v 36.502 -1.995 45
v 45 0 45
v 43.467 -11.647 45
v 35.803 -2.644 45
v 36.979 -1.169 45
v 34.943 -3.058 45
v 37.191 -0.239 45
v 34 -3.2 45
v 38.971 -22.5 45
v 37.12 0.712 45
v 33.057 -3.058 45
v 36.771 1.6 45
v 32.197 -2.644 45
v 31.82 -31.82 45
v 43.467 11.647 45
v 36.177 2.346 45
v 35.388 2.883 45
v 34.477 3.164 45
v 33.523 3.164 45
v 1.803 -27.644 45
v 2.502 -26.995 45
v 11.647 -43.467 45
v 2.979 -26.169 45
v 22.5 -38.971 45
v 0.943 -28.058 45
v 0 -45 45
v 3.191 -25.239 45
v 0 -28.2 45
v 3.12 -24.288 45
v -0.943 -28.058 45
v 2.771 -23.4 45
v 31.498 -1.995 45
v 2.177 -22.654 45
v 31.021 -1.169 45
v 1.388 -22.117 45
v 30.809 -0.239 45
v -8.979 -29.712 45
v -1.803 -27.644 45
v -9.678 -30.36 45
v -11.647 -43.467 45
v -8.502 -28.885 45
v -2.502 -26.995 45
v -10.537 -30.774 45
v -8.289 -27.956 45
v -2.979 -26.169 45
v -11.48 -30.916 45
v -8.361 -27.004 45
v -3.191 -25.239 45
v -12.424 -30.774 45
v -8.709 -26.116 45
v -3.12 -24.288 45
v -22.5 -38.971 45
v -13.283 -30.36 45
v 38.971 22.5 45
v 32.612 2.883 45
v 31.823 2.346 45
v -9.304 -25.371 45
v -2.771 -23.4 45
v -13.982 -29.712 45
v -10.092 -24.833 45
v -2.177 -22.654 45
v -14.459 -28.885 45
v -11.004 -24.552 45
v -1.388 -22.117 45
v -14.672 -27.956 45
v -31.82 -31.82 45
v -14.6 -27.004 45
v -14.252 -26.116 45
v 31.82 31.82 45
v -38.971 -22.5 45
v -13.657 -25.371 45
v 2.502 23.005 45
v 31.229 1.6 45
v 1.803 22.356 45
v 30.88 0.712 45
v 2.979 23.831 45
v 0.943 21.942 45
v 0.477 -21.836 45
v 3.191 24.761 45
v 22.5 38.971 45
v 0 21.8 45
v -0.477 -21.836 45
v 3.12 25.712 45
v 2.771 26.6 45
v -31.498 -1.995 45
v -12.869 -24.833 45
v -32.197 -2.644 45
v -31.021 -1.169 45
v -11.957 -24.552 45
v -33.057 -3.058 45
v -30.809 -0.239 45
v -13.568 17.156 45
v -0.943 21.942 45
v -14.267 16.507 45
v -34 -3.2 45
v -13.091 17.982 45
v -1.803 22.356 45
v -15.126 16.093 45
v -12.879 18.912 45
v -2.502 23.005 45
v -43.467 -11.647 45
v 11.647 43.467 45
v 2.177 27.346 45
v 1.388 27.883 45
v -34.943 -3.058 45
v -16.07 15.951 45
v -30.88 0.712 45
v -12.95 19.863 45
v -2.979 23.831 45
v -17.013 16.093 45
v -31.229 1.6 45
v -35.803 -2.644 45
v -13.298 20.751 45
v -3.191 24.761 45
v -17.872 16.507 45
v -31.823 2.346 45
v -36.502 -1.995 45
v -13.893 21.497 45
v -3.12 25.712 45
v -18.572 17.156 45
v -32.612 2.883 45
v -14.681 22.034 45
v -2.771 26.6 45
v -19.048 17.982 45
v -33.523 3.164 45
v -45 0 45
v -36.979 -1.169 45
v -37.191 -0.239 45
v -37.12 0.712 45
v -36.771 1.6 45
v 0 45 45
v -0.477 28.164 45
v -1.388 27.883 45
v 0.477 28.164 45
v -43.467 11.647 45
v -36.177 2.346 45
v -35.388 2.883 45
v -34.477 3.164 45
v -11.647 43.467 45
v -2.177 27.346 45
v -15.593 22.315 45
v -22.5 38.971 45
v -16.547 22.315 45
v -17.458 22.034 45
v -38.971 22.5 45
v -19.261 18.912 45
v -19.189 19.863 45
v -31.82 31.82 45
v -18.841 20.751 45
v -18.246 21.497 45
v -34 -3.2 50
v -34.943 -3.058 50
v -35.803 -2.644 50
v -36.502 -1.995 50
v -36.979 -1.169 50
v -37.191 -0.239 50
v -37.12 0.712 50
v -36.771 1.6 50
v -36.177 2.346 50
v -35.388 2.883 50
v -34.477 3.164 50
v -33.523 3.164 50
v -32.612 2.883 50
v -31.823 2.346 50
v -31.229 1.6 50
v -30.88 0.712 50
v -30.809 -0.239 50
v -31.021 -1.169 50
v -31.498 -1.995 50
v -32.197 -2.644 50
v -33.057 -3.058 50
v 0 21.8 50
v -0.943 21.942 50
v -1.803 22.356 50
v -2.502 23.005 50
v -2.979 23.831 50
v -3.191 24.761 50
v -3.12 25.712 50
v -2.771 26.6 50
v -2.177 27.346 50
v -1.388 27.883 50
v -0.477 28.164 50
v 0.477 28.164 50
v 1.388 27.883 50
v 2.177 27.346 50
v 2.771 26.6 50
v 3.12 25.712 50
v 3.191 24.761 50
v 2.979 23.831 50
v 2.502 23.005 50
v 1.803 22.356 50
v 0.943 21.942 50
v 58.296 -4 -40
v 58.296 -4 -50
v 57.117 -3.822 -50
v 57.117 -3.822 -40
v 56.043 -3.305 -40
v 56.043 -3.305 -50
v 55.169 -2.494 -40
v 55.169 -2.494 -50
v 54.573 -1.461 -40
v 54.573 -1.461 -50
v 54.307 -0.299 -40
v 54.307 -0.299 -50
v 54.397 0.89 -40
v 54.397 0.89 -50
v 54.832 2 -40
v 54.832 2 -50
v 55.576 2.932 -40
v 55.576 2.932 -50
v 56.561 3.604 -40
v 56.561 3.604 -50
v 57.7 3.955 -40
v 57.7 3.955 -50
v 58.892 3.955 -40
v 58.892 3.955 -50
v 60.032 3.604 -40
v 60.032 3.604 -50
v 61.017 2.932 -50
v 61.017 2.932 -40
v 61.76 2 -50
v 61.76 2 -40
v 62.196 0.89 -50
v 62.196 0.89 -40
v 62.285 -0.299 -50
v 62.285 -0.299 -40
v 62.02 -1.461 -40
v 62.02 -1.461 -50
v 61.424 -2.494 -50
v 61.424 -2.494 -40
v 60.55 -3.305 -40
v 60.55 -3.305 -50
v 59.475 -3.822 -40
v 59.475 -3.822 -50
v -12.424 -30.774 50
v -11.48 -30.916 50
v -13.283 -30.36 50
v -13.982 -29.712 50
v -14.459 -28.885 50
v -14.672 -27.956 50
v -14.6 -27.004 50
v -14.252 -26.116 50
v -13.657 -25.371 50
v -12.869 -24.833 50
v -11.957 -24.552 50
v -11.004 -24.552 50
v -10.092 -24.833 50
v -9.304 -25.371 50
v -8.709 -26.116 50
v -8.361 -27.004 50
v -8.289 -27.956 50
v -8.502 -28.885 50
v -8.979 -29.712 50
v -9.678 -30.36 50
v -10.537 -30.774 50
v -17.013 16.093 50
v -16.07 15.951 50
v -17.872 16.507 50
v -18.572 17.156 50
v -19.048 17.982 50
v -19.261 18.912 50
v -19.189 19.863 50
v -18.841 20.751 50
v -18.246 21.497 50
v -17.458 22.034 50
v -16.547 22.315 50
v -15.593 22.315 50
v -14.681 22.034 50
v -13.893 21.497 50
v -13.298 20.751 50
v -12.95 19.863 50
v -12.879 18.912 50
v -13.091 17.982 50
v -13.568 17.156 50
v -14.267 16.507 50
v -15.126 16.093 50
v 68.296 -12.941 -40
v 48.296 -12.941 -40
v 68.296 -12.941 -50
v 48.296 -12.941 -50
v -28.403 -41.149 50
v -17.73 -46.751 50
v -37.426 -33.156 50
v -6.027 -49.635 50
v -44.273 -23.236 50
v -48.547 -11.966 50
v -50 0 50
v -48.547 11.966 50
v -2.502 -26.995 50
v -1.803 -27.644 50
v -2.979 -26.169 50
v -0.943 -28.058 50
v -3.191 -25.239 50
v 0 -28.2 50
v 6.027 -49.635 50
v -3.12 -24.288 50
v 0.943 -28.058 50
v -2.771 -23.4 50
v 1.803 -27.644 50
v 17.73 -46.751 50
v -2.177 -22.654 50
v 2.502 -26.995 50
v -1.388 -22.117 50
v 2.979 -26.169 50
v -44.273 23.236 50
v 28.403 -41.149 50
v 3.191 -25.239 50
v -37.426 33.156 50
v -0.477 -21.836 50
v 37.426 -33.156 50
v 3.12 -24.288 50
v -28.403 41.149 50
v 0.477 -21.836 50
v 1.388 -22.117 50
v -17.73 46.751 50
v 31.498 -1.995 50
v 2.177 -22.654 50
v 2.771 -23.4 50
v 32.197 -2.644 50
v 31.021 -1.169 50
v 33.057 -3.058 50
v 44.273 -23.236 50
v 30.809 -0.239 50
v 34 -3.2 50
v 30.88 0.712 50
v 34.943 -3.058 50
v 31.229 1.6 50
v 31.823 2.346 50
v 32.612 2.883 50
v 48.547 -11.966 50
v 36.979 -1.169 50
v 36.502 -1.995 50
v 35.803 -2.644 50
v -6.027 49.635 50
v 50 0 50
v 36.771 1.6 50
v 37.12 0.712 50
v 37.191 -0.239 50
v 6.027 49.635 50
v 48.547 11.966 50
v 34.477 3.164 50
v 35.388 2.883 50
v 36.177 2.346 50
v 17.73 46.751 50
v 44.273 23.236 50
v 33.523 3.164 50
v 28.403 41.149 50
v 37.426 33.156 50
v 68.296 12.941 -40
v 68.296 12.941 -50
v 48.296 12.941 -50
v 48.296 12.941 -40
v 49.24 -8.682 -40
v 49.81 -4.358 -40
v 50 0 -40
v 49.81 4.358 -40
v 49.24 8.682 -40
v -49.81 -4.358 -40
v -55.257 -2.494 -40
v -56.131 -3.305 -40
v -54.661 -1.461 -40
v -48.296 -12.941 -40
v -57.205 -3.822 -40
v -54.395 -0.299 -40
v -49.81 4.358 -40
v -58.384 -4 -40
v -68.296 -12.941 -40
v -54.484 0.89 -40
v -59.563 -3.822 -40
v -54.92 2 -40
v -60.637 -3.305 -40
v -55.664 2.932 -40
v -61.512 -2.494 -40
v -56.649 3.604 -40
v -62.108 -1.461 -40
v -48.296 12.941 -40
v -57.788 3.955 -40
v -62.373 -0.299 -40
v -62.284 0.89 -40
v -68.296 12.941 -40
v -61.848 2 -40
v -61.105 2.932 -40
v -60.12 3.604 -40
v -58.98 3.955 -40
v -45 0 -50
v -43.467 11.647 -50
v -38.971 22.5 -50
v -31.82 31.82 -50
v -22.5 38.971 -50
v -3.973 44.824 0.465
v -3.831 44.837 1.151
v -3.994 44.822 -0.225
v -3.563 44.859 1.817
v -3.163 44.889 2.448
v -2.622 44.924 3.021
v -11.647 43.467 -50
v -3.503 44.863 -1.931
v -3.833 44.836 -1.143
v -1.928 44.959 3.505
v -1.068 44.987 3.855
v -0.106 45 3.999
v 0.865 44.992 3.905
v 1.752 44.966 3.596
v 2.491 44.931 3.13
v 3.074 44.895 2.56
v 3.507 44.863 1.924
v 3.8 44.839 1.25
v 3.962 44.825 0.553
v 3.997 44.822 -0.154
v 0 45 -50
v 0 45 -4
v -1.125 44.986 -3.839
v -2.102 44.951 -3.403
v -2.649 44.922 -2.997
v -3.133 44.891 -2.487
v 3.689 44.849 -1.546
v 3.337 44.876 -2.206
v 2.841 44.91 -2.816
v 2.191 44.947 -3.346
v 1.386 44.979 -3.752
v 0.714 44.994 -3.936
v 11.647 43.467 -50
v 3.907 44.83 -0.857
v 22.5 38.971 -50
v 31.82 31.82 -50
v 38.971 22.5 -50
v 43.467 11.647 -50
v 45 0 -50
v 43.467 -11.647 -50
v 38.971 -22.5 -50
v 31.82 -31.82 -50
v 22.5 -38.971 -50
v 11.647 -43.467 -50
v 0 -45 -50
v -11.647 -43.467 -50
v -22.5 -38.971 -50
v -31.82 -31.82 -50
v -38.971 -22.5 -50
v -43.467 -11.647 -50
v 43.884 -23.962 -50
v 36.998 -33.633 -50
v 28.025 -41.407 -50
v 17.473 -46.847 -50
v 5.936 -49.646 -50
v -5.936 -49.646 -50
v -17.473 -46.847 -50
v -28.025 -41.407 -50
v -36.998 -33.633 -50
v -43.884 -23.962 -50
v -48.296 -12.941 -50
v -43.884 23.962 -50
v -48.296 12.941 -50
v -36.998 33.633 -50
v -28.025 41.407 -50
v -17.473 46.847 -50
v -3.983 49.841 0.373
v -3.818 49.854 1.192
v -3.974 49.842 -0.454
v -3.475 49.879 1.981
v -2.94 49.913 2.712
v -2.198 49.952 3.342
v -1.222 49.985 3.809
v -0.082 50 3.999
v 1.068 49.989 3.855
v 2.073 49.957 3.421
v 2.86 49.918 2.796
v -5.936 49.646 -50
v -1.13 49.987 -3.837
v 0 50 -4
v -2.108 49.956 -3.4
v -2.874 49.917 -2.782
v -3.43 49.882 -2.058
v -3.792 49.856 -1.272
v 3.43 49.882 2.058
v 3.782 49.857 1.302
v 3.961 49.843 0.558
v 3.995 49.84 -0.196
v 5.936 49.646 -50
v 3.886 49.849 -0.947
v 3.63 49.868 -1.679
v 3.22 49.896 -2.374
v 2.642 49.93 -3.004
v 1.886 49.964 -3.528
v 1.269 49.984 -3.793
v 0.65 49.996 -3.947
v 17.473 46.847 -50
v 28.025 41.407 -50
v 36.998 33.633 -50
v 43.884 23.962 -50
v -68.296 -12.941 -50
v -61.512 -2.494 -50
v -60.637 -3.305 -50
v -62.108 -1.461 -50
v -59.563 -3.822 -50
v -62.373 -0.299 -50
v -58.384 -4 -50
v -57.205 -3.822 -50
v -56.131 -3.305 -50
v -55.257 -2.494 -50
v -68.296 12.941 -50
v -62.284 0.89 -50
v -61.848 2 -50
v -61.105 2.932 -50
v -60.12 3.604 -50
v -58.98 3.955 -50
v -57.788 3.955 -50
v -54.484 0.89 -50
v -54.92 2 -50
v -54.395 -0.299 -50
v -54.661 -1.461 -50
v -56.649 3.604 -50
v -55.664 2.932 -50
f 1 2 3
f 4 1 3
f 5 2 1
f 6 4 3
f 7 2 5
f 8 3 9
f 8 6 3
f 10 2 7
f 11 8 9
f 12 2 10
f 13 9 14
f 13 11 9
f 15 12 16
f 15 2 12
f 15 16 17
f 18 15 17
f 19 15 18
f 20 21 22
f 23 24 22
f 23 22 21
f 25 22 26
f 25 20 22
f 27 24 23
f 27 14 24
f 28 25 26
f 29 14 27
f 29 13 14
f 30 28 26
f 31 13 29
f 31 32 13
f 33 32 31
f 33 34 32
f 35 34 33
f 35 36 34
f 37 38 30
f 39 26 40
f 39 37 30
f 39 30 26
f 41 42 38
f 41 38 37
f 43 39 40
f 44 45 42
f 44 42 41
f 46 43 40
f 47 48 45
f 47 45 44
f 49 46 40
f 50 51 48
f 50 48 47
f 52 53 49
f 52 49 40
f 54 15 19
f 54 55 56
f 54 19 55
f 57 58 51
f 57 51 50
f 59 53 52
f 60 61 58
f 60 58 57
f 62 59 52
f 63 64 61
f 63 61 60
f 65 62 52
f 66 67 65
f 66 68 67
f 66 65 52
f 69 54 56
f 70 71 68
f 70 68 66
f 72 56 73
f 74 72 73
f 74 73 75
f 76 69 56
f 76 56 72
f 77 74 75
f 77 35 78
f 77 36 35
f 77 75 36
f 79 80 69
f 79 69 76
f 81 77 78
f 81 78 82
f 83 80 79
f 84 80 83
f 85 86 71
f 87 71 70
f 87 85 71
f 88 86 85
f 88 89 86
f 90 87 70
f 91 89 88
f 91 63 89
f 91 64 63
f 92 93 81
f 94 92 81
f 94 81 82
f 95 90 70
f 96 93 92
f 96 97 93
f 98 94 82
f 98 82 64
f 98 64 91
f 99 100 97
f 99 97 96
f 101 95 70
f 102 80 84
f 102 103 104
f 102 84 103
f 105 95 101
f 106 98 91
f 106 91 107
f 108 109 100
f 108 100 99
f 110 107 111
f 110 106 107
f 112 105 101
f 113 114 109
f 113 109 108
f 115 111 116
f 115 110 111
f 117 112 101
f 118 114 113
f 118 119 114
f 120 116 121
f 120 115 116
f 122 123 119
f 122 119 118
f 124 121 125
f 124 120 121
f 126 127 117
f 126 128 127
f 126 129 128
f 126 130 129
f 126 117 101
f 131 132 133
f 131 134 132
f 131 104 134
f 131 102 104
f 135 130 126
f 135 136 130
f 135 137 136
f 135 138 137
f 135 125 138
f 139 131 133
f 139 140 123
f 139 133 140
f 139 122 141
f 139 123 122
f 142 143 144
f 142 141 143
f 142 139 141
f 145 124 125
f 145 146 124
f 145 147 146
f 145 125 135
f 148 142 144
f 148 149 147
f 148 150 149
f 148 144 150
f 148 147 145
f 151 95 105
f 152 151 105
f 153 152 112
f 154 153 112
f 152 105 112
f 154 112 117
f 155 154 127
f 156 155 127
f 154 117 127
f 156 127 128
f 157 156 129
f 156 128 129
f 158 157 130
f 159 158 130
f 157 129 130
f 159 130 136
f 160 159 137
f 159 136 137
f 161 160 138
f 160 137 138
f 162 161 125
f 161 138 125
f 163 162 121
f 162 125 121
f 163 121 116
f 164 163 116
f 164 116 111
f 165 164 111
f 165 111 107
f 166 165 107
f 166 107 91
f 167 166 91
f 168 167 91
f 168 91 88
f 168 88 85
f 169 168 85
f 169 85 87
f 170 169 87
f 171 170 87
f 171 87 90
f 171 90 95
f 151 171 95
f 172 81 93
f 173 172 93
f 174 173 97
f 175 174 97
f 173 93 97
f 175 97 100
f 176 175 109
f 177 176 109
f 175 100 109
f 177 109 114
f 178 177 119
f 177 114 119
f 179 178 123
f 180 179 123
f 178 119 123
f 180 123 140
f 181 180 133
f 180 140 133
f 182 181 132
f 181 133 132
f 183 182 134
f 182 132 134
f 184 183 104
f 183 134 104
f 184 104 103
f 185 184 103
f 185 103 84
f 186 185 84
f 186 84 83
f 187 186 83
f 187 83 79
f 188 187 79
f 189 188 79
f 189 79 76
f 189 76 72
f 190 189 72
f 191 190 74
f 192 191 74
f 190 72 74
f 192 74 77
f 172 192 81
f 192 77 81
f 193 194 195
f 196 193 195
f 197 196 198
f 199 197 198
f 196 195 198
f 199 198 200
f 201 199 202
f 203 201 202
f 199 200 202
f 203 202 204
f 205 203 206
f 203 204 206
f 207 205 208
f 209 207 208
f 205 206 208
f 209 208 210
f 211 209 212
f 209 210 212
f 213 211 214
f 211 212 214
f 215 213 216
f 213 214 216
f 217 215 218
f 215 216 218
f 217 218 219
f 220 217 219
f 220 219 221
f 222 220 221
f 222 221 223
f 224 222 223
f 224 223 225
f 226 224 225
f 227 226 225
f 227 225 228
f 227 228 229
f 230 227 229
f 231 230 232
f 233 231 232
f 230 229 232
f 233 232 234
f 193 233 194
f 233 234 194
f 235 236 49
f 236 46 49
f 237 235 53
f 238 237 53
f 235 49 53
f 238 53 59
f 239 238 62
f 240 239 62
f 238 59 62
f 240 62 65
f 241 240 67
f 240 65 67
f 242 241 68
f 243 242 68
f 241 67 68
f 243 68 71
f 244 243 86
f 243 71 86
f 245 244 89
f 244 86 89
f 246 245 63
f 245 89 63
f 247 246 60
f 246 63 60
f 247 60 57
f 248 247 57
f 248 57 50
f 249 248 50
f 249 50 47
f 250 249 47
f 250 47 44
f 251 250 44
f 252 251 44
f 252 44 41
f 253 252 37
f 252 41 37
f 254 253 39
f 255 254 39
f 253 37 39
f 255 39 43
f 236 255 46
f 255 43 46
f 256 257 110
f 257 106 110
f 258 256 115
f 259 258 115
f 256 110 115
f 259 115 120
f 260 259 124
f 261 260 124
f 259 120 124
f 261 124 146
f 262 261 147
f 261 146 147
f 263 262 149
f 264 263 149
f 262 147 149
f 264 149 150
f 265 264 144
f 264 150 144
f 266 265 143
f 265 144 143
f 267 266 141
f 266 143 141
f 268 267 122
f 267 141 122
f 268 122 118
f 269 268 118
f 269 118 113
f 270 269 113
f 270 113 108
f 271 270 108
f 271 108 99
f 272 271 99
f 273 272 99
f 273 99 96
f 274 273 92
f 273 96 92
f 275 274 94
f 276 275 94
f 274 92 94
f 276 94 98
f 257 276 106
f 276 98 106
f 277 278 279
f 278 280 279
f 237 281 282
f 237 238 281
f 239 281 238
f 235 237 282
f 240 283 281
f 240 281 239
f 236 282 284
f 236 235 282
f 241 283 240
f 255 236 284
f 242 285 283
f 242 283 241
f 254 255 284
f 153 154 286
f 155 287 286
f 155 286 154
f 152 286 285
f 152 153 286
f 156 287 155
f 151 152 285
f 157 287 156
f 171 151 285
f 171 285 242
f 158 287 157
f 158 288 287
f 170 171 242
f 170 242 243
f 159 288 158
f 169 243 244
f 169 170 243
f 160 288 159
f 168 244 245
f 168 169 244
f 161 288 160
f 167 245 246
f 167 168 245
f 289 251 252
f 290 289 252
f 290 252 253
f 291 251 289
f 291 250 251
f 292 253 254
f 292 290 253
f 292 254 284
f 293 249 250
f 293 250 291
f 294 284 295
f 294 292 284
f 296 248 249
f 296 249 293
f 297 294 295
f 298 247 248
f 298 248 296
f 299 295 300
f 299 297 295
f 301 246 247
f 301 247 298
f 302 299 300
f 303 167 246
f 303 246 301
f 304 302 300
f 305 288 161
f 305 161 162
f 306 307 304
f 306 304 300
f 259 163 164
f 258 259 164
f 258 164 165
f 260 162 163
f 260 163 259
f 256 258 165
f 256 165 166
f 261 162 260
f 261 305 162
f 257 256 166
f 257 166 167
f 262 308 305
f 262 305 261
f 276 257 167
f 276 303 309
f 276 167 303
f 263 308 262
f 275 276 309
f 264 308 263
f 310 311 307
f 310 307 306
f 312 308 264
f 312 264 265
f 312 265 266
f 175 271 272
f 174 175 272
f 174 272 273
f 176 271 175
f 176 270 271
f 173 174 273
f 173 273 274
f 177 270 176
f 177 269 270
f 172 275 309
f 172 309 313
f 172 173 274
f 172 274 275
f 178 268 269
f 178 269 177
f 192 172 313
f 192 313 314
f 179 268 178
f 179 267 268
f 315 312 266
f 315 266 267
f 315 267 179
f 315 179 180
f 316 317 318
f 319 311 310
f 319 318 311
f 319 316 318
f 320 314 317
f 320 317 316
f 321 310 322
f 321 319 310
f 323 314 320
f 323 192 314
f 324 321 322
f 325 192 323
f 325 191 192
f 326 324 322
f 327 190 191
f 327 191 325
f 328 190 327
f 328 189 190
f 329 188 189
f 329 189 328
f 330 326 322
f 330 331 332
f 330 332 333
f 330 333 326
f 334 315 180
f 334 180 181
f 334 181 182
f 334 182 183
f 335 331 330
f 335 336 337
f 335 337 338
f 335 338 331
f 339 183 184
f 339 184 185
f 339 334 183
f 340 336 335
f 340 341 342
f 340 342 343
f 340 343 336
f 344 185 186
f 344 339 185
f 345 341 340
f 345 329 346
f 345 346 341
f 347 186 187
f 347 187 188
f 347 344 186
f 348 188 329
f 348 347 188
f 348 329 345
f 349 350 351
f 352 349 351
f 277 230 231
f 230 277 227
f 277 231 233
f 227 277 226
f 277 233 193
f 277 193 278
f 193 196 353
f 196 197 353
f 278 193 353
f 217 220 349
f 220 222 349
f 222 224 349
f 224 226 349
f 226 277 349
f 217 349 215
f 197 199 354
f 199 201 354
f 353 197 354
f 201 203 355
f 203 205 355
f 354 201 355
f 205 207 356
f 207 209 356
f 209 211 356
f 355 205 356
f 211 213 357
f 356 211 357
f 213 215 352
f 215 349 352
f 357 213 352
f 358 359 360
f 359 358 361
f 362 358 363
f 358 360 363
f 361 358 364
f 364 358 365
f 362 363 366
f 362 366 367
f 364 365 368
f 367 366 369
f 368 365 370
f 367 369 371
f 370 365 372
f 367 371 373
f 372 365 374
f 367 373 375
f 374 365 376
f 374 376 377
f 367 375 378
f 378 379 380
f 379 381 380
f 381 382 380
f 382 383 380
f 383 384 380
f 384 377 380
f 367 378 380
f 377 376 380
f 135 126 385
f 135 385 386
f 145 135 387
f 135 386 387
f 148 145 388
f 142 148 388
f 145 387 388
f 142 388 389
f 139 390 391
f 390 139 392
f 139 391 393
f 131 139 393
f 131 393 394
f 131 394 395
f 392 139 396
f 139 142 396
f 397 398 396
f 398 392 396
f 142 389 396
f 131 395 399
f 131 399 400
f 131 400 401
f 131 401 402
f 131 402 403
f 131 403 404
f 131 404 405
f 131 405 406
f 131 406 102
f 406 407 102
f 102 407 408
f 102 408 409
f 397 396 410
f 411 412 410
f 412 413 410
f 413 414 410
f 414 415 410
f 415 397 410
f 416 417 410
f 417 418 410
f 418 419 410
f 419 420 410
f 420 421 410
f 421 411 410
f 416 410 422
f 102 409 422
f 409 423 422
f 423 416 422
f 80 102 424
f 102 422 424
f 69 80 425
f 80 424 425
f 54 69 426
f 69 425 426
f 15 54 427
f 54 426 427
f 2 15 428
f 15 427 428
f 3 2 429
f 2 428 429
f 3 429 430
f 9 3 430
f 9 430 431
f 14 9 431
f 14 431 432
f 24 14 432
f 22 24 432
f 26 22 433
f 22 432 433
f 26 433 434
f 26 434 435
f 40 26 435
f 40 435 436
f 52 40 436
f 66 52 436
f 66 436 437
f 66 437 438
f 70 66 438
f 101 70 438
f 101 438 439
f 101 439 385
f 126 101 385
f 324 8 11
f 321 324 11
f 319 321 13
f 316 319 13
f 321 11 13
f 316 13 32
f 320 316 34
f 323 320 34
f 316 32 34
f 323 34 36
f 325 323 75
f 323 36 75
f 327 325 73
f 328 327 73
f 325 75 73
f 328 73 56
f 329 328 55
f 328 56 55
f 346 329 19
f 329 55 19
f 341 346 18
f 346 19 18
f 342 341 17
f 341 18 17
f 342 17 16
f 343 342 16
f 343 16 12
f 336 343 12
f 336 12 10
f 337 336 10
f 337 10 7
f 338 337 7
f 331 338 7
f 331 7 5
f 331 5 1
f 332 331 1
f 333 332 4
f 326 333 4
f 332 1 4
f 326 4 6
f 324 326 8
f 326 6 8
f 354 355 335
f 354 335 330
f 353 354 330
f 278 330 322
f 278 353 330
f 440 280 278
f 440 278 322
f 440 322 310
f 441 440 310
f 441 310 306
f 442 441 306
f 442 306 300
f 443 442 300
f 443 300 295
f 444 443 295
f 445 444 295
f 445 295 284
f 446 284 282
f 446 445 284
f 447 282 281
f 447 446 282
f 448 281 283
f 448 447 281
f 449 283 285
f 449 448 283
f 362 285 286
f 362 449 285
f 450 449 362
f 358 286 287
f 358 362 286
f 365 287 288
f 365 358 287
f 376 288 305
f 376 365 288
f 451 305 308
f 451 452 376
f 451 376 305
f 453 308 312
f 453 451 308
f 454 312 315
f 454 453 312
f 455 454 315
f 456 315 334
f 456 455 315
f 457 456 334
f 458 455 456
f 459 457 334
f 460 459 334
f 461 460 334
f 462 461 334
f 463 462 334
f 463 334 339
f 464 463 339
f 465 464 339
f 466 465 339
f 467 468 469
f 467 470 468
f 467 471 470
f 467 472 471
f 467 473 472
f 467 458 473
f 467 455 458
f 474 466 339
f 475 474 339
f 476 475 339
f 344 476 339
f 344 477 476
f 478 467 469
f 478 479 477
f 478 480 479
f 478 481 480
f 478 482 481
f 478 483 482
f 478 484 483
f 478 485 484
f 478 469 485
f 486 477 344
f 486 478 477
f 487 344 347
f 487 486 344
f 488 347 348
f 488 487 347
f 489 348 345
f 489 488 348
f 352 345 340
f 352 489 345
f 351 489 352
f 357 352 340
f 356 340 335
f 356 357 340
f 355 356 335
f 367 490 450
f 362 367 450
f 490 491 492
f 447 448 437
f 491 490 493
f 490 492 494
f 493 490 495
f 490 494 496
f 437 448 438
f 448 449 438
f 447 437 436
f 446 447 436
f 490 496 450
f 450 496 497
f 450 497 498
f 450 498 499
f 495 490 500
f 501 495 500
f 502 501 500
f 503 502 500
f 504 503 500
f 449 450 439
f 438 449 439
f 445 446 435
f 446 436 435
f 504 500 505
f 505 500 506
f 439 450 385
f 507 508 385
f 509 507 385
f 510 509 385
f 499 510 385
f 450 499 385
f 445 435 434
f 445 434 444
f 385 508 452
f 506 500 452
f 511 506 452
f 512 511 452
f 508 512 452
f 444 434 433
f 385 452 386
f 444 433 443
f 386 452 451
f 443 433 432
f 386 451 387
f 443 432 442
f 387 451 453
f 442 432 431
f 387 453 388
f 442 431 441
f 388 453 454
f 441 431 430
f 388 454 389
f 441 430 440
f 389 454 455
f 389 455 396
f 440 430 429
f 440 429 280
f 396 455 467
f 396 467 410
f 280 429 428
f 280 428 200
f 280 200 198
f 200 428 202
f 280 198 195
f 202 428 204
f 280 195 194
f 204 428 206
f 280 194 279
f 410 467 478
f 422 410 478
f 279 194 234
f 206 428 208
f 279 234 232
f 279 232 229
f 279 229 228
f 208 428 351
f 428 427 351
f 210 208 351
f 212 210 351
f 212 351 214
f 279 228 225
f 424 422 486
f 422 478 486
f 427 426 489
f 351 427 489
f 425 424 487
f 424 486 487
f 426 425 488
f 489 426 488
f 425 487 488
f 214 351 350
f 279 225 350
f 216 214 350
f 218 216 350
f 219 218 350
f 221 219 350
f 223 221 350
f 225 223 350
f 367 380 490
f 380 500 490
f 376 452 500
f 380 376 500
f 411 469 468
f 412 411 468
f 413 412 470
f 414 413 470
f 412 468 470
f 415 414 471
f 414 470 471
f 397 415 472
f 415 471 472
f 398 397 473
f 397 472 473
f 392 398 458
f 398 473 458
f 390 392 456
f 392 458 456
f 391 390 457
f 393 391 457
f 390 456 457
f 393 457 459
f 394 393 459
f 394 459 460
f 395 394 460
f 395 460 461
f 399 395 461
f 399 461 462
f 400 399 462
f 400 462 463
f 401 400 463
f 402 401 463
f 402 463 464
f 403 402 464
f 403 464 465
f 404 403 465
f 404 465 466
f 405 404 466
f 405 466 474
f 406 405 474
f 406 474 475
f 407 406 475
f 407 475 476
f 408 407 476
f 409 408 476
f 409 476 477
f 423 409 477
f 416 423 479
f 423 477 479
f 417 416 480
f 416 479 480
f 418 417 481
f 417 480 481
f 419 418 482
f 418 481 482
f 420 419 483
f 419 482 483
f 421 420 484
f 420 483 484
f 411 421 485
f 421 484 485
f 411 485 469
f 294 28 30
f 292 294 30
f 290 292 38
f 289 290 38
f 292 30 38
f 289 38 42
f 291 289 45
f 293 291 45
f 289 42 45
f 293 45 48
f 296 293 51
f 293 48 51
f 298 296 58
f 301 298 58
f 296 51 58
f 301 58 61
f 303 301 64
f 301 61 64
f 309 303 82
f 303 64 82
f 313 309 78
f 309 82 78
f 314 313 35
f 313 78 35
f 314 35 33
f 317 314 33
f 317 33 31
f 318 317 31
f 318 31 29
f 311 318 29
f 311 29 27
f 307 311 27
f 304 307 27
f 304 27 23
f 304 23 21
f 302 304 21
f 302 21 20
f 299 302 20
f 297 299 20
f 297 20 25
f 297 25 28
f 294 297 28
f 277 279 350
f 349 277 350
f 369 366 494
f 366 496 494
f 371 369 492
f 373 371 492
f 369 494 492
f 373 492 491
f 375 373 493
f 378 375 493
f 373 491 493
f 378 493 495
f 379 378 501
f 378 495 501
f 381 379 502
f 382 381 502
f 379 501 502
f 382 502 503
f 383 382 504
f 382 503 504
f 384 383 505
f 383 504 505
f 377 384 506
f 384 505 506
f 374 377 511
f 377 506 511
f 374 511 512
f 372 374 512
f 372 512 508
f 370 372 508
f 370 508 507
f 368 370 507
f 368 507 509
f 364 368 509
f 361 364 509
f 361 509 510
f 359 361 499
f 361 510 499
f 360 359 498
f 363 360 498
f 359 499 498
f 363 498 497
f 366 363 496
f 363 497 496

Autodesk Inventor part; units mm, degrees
ref_plane "YZ Plane" through (0, 0, 0) normal (1, 0, 0) x (0, 1, 0)
ref_plane "XZ Plane" through (0, 0, 0) normal (0, 1, 0) x (-1, 0, 0)
ref_plane "XY Plane" through (0, 0, 0) normal (0, 0, 1) x (1, 0, 0)
sketch "Sketch1" plane through (0, 0, 0) normal (0, 0, 1) x (1, 0, 0)
  circle A0 centre (0, 0) radius 50
  dimension "d0" = 100
extrude "Extrusion1" add sketch "Sketch1" along normal mid plane 100
sketch "Sketch2" plane through (0, 0, -50) normal (0, 0, -1) x (-1, 0, 0)
  circle A0 centre (0, 0) radius 45
  dimension "d3" = 90
extrude "Extrusion2" cut sketch "Sketch2" against normal blind 95
sketch "Sketch5" plane through (0, 0, 50) normal (0, 0, 1) x (1, 0, 0)
  point P0 (0, 0)
sketch "Sketch7" plane through (0, 0, 50) normal (0, 0, 1) x (1, 0, 0)
  arc A0 (50, 0) -> (50, 0) centre (0, 0) ccw construction
  circle A1 centre (0, 0) radius 50 construction
sketch "Sketch8" plane through (0, 0, -50) normal (0, 0, -1) x (-1, 0, 0)
  arc A0 (48.2963, -12.941) -> (48.2963, 12.941) centre (0, 0) ccw
  line L0 (0, 0) -> (50, 0) construction
  line L1 (48.2963, 12.941) -> (68.2963, 12.941)
  line L2 (68.2963, 12.941) -> (68.2963, -12.941)
  line L3 (68.2963, -12.941) -> (48.2963, -12.941)
  line L4 (48.2963, 12.941) -> (-48.2963, 12.941) construction
  line L5 (48.2963, -12.941) -> (-48.2963, -12.941) construction
  circle A1 centre (0, 0) radius 50 construction
  arc A2 (-48.2963, 12.941) -> (-48.2963, -12.941) centre (0, 0) ccw
  line L6 (-48.2963, -12.941) -> (-68.2963, -12.941)
  line L7 (-68.2963, -12.941) -> (-68.2963, 12.941)
  line L8 (-68.2963, 12.941) -> (-48.2963, 12.941)
  dimension "d31" = 50
  dimension "d34" = 20
  dimension "d35" = 20
extrude "Extrusion5" add sketch "Sketch8" against normal blind 10
sketch "Sketch9" plane through (0, 0, 50) normal (0, 0, 1) x (1, 0, 0)
  point P0 (0, 0)
sketch "Sketch10" plane through (0, 0, 50) normal (0, 0, 1) x (1, 0, 0)
  line L0 (-68.2963, -12.941) -> (-68.2963, 12.941) construction
  line L1 (-68.2963, -12.941) -> (-48.4721, 12.941) construction
  line L2 (-68.2963, 12.941) -> (-48.4721, -12.941) construction
  line L3 (48.2963, 12.941) -> (68.2963, 12.941) construction
  line L4 (48.2963, -12.941) -> (68.2963, 12.941) construction
  line L5 (68.2963, 12.941) -> (68.2963, -12.941) construction
  arc A0 (48.2963, -12.941) -> (48.2963, 12.941) centre (0, 0) ccw construction
  line L6 (68.2963, -12.941) -> (48.2963, 12.941) construction
  point P0 (-58.3842, 0)
  point P1 (58.2963, 0)
hole "Hole2" at (-58.3842, 0, 50) at (58.2963, 0, 50) direction (0, 0, -1) diameter 8 end through all counterbore diameter 11 counterbore depth 6.5
sketch "Sketch11" plane through (-68.2963, -12.941, -50) normal (0, -1, 0) x (1, 0, 0)
  line L0 (20, 0) -> (116.5926, 0) construction
  line L1 (118.2963, 100) -> (18.2963, 100) construction
  line L2 (20, 0) -> (118.2963, 100) construction
  line L3 (118.2963, 100) -> (18.2963, 100) construction
  line L4 (116.5926, 10) -> (116.5926, 0) construction
  line L5 (18.2963, 100) -> (116.5926, 0) construction
  point P0 (68.2963, 50)
  point P1 (68.2963, 50)
hole "Hole3" at (0, -12.941, 0) direction (0, 1, 0) diameter 8 end through all
sketch "Sketch12" plane through (0, 0, 50) normal (0, 0, 1) x (1, 0, 0)
  circle A0 centre (0, 0) radius 42
  circle A1 centre (0, 0) radius 25
  line L0 (0, 70.0025) -> (0, -70.0004) projected
  line L1 (-95.6148, 0) -> (95.6148, 0) projected
  point P0 (0, 25)
  point P1 (0, -25)
  dimension "d52" = 84
  dimension "d53" = 50
hole "Hole4" at (0, 25, 50) at (0, -25, 50) direction (0, 0, -1) diameter 6.4 end through all
sketch "Sketch13" plane through (0, 0, 50) normal (0, 0, 1) x (1, 0, 0)
  circle A0 centre (0, 0) radius 34
  line L0 (0, 70.0025) -> (0, -70.0004) projected
  line L1 (-95.6148, 0) -> (95.6148, 0) projected
  point P0 (-34, 0)
  point P1 (34, 0)
  dimension "d61" = 68
hole "Hole5" at (-34, 0, 50) at (34, 0, 50) direction (0, 0, -1) diameter 6.4 end through all
sketch "Sketch14" plane through (0, 0, 50) normal (0, 0, 1) x (1, 0, 0)
  circle A0 centre (0, 0) radius 25
  line L0 (0, 0) -> (-11.4805, -27.7164)
  line L1 (0, 70.0025) -> (0, -70.0004) projected
  line L2 (-95.6148, 0) -> (95.6148, 0) projected
  dimension "d69" = 50
  dimension "d70" = 30
hole "Hole6" at (-11.4805, -27.7164, 50) direction (0, 0, -1) diameter 6.4 end through all
sketch "Sketch15" plane through (0, 0, 50) normal (0, 0, 1) x (1, 0, 0)
  circle A0 centre (0, 0) radius 25 construction
  line L0 (0, 0) -> (-16.0697, 19.1511) construction
  line L1 (0, 70.0025) -> (0, -70.0004) construction
  line L2 (-95.6148, 0) -> (95.6148, 0) construction
  dimension "d79" = 50
  dimension "d80" = 40
hole "Hole7" at (-16.0697, 19.1511, 50) at (-16.0697, 19.1511, 50) direction (0, 0, -1) diameter 6.4 end through all
properties part number "Hus_Til_Motor"
